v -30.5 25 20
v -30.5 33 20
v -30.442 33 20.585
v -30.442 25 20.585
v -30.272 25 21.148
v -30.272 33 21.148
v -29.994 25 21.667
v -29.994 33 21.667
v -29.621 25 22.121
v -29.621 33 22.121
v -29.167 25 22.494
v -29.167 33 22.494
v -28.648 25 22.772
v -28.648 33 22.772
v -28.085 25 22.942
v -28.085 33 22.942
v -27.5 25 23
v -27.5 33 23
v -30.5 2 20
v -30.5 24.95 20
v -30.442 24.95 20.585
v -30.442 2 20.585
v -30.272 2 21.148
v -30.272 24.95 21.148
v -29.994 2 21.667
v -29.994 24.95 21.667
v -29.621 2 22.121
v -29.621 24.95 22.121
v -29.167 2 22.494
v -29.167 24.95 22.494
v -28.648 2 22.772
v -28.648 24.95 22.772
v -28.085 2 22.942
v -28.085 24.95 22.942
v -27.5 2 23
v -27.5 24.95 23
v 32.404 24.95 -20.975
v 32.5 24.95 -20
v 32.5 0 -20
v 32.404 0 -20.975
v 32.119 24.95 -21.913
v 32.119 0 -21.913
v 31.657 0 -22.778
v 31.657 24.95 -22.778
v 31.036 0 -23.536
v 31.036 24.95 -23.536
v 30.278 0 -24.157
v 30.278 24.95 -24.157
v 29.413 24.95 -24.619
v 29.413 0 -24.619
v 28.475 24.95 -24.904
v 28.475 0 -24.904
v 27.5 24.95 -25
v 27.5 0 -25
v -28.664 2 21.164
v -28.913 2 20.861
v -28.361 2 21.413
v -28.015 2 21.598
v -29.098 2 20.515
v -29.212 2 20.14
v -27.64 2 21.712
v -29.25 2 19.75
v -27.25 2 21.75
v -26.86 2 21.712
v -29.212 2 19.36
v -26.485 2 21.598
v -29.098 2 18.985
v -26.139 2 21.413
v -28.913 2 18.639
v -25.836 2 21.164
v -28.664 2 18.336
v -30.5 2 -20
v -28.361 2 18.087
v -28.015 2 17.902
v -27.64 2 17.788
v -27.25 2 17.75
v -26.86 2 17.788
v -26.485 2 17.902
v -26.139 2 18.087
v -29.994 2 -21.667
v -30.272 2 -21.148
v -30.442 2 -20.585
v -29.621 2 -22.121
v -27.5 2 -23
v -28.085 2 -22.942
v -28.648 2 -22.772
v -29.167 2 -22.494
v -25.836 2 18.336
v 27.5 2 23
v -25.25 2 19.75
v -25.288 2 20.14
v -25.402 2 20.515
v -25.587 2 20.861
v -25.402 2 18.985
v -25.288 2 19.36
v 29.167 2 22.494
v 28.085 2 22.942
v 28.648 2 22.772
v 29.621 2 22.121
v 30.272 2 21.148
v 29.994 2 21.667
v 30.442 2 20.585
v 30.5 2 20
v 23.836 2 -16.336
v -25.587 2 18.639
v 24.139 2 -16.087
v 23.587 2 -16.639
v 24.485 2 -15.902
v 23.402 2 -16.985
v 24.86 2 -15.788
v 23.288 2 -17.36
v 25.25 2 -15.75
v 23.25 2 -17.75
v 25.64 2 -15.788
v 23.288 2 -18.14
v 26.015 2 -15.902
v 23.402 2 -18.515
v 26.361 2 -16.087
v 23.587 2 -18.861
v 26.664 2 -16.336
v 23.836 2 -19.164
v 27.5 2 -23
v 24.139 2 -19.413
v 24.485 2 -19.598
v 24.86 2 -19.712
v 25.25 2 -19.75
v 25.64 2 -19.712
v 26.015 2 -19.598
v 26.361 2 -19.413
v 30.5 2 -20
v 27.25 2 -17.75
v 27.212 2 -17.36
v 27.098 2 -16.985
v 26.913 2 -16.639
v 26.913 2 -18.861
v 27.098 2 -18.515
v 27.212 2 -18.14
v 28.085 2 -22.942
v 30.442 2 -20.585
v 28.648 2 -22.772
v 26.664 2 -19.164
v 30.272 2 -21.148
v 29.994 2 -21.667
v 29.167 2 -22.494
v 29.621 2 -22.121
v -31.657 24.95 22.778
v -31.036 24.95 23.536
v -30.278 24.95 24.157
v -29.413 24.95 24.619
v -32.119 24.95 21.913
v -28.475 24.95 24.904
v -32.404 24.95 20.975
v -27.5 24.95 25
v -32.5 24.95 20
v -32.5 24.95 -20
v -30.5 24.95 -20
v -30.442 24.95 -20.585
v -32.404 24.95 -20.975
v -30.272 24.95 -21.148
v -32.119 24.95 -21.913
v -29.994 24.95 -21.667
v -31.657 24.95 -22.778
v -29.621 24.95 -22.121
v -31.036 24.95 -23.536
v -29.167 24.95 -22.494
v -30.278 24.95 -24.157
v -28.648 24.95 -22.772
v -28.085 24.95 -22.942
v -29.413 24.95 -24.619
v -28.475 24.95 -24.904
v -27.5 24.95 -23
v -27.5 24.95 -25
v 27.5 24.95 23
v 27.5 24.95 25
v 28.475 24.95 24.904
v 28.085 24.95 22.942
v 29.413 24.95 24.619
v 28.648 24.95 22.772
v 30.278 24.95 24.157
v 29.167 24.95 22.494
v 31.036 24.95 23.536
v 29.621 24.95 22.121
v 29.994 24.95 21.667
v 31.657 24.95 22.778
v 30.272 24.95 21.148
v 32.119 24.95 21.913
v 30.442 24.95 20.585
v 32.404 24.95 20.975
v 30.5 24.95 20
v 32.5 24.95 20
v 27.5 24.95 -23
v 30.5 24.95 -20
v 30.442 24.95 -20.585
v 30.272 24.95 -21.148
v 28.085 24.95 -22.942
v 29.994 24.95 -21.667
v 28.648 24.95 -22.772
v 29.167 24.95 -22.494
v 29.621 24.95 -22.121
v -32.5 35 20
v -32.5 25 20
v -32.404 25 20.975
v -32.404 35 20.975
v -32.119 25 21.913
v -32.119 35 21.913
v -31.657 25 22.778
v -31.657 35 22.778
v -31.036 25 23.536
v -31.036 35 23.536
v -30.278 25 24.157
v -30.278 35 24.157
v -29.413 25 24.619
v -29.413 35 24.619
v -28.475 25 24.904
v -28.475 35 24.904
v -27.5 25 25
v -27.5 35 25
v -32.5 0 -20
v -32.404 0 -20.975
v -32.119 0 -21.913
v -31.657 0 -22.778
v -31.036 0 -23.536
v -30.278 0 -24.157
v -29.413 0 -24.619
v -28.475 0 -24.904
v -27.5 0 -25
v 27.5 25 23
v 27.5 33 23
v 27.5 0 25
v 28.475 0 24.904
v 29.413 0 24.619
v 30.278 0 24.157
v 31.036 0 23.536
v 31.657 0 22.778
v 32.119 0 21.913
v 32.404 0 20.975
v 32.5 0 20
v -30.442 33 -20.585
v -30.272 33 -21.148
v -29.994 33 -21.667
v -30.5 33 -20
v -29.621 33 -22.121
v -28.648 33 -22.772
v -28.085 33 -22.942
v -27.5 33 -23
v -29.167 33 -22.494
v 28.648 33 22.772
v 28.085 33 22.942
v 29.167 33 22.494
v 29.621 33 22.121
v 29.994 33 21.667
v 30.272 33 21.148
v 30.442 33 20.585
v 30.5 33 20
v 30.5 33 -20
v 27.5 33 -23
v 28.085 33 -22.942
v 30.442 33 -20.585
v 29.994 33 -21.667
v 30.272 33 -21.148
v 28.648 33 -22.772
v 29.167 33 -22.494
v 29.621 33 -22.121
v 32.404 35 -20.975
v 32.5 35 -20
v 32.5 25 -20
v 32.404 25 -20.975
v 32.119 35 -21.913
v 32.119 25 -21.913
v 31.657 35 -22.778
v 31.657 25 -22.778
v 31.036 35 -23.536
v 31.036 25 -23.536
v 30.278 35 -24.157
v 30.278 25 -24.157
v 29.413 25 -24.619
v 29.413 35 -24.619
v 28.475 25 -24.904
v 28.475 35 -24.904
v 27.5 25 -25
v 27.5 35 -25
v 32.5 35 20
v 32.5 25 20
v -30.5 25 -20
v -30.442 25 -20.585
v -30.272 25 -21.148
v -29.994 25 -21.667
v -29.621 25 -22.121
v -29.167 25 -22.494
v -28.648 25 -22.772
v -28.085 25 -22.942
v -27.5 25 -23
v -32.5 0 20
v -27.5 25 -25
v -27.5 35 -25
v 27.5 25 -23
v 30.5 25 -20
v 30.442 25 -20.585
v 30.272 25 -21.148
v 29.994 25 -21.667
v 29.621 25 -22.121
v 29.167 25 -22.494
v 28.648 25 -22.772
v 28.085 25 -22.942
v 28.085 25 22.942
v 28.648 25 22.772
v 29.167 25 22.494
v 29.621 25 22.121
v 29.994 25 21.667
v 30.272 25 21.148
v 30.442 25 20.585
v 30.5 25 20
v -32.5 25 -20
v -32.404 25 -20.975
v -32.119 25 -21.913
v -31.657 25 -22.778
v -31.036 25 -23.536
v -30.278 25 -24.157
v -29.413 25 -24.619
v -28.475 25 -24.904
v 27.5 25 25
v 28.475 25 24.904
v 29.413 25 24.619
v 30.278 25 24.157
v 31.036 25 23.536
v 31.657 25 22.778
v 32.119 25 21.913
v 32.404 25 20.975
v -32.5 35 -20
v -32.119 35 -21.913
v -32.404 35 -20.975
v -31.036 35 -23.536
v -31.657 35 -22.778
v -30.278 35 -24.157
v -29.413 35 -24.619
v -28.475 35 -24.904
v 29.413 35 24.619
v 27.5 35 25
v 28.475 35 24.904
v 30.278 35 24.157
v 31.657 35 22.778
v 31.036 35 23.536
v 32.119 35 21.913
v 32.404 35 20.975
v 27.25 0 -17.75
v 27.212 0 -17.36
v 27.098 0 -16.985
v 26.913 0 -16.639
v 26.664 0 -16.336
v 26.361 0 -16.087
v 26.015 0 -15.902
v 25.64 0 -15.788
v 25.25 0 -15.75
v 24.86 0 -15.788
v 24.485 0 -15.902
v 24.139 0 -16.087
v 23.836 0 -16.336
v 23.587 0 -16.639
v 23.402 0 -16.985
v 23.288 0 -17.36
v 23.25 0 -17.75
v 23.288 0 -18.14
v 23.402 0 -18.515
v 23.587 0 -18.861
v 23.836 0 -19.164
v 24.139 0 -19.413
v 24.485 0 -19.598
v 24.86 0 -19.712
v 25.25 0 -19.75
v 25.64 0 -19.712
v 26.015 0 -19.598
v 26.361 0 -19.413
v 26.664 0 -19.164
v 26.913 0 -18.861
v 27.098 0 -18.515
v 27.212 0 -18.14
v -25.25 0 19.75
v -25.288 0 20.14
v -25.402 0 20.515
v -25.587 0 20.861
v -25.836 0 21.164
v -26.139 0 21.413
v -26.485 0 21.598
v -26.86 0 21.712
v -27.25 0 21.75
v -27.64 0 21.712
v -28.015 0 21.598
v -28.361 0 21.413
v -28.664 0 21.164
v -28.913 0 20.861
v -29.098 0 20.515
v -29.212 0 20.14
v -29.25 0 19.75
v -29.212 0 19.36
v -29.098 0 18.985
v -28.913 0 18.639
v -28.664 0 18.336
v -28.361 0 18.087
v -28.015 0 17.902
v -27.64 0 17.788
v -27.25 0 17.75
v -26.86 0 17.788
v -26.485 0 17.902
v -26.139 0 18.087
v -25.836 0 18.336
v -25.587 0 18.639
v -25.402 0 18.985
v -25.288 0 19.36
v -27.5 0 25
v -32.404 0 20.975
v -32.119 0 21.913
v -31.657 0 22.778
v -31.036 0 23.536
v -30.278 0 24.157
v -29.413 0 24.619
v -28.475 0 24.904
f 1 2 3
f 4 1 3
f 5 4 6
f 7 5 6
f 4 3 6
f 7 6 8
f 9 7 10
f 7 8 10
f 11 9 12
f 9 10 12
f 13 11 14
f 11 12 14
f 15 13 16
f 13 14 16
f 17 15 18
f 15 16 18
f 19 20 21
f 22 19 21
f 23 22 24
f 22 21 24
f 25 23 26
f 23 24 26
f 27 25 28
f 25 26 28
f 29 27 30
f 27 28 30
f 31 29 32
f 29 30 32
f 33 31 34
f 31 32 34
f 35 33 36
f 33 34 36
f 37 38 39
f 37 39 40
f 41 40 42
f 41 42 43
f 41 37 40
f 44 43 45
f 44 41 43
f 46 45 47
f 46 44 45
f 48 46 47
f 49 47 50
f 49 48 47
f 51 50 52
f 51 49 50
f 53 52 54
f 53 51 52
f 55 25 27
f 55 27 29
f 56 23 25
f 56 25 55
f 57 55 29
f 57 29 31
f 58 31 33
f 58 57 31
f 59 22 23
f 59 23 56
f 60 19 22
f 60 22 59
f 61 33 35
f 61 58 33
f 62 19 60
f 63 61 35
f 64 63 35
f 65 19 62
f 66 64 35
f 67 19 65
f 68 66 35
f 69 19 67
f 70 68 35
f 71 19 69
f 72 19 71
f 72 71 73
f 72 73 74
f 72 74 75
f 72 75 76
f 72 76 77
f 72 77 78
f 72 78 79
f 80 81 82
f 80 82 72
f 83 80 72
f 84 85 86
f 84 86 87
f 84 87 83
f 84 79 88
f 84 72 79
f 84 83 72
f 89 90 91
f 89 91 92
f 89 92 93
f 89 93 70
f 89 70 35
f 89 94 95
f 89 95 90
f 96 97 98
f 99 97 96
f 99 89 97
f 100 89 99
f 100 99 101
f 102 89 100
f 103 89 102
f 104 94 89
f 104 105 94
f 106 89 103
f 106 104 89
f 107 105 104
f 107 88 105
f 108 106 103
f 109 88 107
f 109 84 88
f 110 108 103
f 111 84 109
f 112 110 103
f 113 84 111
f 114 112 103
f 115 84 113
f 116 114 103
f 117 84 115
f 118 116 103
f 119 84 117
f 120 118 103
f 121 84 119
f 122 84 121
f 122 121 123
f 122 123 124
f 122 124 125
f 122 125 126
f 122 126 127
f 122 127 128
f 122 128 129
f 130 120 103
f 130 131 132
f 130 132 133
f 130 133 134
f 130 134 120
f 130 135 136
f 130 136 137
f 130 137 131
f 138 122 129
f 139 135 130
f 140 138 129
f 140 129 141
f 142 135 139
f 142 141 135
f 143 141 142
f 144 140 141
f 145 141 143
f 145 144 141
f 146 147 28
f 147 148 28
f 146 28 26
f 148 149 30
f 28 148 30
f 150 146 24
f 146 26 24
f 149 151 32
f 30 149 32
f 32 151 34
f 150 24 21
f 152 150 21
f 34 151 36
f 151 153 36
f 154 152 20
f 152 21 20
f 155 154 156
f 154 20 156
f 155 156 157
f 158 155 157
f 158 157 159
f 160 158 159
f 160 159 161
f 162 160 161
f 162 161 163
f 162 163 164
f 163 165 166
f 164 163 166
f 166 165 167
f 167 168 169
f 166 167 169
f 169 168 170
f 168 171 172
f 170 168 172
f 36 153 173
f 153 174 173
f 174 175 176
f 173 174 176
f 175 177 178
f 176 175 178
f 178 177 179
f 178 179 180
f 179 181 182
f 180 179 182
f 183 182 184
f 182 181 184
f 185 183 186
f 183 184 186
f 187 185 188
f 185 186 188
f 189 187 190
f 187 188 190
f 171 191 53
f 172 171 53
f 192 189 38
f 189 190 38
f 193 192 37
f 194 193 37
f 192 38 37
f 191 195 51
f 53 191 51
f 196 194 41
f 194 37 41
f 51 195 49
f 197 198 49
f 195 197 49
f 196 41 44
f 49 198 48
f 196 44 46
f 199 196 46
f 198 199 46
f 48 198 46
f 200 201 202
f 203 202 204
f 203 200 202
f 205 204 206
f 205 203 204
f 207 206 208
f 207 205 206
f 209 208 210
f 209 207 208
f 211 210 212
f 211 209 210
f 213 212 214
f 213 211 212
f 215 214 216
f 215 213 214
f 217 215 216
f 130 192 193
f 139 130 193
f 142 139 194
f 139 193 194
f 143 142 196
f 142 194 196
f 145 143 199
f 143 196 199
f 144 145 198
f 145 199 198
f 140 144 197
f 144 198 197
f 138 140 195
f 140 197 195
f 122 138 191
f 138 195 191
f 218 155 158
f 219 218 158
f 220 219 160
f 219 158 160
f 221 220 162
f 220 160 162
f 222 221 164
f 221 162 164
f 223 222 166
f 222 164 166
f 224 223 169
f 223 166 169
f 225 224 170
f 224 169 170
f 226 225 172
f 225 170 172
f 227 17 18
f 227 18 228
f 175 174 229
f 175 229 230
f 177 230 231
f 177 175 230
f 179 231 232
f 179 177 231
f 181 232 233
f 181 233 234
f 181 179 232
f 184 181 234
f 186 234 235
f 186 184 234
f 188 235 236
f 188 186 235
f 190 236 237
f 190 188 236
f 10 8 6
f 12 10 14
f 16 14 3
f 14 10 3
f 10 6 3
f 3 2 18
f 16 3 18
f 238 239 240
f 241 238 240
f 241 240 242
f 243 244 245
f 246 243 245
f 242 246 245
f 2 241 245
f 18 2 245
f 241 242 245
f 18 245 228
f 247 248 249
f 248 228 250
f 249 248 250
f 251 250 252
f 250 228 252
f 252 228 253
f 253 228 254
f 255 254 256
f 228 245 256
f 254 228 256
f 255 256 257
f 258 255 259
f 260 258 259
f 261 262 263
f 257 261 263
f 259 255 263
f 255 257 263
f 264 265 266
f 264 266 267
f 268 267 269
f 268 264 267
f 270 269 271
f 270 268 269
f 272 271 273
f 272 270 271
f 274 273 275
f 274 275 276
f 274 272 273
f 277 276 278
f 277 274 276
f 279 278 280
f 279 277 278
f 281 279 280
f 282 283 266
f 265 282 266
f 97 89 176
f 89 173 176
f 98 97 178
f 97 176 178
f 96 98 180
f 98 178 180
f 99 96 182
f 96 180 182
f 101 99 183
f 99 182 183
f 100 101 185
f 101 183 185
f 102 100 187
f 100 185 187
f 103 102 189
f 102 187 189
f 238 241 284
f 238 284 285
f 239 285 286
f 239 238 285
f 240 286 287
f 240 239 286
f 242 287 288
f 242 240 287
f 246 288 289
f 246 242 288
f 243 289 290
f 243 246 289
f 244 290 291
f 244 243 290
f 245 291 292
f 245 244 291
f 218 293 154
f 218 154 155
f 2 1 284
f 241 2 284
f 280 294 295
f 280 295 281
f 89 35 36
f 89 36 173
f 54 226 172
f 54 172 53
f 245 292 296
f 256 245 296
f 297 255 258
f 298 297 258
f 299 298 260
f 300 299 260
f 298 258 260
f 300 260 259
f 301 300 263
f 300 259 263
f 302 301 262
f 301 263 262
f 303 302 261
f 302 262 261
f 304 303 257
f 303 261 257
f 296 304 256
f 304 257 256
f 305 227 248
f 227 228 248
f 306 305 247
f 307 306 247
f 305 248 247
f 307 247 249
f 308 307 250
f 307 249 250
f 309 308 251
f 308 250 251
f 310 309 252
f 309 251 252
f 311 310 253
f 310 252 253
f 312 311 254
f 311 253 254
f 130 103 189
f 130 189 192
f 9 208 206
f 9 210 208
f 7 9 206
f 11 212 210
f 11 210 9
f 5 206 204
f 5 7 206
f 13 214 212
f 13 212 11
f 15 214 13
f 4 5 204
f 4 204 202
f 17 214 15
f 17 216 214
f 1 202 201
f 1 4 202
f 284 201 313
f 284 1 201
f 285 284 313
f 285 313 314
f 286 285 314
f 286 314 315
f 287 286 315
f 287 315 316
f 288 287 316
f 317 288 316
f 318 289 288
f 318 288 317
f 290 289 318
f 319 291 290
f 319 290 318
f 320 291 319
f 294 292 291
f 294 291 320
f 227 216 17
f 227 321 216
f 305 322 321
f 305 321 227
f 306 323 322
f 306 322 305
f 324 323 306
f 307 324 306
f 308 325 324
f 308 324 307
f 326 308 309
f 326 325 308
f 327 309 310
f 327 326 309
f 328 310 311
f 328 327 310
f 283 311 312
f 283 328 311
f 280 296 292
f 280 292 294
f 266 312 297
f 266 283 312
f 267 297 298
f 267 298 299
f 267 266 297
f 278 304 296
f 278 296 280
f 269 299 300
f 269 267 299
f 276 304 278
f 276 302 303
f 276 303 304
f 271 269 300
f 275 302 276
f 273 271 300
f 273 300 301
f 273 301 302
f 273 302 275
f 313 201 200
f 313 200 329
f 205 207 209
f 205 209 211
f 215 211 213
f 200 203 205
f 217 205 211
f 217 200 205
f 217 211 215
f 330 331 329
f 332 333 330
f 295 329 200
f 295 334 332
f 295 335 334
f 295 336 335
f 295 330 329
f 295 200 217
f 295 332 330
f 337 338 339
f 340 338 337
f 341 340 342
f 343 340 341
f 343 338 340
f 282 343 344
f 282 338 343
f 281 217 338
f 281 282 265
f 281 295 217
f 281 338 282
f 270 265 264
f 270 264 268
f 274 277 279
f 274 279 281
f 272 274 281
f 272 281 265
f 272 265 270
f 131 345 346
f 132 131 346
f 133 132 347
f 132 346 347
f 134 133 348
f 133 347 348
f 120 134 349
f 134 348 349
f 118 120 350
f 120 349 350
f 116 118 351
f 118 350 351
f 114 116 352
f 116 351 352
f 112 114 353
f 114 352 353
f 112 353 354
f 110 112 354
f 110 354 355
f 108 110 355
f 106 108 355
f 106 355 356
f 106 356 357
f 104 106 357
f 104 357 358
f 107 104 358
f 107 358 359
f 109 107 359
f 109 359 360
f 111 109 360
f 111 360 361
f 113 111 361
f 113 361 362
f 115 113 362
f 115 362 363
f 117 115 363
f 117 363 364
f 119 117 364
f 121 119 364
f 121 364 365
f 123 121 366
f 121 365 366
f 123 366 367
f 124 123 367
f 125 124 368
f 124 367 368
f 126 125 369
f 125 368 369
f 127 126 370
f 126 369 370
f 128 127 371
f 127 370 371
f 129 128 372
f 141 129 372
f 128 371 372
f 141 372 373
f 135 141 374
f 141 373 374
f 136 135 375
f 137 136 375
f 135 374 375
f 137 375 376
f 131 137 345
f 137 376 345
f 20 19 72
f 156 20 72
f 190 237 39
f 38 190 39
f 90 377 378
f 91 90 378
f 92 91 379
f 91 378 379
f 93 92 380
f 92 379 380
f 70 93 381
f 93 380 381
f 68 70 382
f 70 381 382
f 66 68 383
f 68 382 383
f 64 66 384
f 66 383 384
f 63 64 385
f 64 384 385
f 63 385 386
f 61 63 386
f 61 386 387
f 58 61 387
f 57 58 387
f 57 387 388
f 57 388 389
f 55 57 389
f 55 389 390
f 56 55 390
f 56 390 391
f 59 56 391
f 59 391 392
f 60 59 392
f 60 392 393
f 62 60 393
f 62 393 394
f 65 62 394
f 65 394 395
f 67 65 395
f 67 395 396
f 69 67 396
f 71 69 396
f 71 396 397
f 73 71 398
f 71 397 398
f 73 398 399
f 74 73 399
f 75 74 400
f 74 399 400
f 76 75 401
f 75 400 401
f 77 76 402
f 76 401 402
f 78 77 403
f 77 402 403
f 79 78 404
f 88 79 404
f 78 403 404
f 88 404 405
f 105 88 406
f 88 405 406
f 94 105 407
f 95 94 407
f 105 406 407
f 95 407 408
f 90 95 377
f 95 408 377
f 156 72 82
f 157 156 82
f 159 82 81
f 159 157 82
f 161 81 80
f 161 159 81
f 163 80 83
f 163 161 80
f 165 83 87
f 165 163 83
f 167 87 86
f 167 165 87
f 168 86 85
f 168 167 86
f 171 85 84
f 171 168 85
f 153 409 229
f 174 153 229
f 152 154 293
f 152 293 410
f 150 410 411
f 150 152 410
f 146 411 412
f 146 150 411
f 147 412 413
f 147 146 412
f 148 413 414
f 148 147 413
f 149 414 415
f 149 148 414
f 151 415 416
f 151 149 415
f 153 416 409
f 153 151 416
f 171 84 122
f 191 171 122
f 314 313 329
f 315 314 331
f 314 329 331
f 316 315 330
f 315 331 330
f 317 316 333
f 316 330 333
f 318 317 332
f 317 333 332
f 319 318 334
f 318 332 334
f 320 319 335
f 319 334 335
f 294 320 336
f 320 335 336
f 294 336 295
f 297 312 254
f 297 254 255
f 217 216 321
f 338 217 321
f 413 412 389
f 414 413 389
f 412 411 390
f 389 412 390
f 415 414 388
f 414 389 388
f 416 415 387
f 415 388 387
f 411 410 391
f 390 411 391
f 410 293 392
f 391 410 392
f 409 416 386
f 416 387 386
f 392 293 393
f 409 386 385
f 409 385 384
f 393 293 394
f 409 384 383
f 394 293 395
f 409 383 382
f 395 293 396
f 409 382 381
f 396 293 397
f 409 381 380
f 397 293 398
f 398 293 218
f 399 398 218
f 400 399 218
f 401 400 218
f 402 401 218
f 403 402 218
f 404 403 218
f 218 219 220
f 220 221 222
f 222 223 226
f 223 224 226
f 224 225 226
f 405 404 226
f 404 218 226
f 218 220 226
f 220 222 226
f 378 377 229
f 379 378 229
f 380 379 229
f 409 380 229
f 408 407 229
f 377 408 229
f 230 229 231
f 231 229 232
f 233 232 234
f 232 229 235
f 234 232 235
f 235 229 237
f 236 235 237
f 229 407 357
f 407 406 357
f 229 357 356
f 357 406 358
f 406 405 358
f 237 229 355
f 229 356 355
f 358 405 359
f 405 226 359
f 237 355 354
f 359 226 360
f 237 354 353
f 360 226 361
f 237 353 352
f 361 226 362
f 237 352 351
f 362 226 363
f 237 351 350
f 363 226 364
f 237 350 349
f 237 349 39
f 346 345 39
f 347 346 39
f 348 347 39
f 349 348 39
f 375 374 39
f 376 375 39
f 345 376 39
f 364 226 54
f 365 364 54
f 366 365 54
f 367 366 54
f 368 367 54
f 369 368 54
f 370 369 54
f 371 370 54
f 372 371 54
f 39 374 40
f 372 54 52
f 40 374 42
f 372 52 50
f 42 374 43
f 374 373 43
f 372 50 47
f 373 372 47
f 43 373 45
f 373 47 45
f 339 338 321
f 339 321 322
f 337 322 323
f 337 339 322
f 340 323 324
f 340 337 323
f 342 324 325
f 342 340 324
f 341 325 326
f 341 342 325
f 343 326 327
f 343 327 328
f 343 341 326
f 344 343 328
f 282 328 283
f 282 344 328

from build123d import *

# Parameters (mm, degrees)
SKETCH1_W           = 65
SKETCH1_H           = 50
BOSS_EXTRUDE1_DEPTH = 35
FILLET2_R           = 5
SHELL3_T            = 2
SKETCH5_W           = 50
SKETCH5_H           = 0.05
CUT_EXTRUDE1_DEPTH  = 66
CUT_EXTRUDE2_REACH  = 37
SKETCH6_R           = 2


with BuildPart() as part:
    # Sketch1 → Boss-Extrude1 (new body)
    with BuildSketch(Plane(origin=(0, 0, 0), x_dir=(1, 0, 0), z_dir=(0, 1, 0))):
        Rectangle(SKETCH1_W, SKETCH1_H)
    extrude(amount=BOSS_EXTRUDE1_DEPTH)

    # Fillet2
    fillet2_edges = [part.edges().sort_by_distance(p)[0] for p in [
        (32.5, 17.5, 25),
        (-32.5, 17.5, 25),
        (-32.5, 17.5, -25),
        (32.5, 17.5, -25),
    ]]
    fillet(fillet2_edges, radius=FILLET2_R)

    # Shell3 (no face opened: a closed hollow body)
    add(offset(amount=-SHELL3_T, mode=Mode.PRIVATE), mode=Mode.SUBTRACT)

    # Sketch5 → Cut-Extrude1 (cut, through all)
    with BuildSketch(Plane(origin=(32.5, 0, 0), x_dir=(0, 0, -1), z_dir=(1, 0, 0))):
        with Locations((0, 24.975)):
            Rectangle(SKETCH5_W, SKETCH5_H)
    extrude(amount=-CUT_EXTRUDE1_DEPTH, mode=Mode.SUBTRACT)

    # Sketch6 → Cut-Extrude2 (cut, up to next)
    with BuildSketch(Plane.XZ, mode=Mode.PRIVATE) as cut_extrude2_sk1:
        with Locations((-27.25, 19.75)):
            Circle(SKETCH6_R)
    cut_extrude2_tool1 = extrude(cut_extrude2_sk1.sketch, amount=-CUT_EXTRUDE2_REACH, mode=Mode.PRIVATE) & part.part
    add(cut_extrude2_tool1.solids().sort_by_distance((-27.25, 0, 19.75))[0], mode=Mode.SUBTRACT)
    # Sketch6 → Cut-Extrude2 (cut, up to next)
    with BuildSketch(Plane.XZ, mode=Mode.PRIVATE) as cut_extrude2_sk2:
        with Locations((25.25, -17.75)):
            Circle(SKETCH6_R)
    cut_extrude2_tool2 = extrude(cut_extrude2_sk2.sketch, amount=-CUT_EXTRUDE2_REACH, mode=Mode.PRIVATE) & part.part
    add(cut_extrude2_tool2.solids().sort_by_distance((25.25, 0, -17.75))[0], mode=Mode.SUBTRACT)


solid = part.part
